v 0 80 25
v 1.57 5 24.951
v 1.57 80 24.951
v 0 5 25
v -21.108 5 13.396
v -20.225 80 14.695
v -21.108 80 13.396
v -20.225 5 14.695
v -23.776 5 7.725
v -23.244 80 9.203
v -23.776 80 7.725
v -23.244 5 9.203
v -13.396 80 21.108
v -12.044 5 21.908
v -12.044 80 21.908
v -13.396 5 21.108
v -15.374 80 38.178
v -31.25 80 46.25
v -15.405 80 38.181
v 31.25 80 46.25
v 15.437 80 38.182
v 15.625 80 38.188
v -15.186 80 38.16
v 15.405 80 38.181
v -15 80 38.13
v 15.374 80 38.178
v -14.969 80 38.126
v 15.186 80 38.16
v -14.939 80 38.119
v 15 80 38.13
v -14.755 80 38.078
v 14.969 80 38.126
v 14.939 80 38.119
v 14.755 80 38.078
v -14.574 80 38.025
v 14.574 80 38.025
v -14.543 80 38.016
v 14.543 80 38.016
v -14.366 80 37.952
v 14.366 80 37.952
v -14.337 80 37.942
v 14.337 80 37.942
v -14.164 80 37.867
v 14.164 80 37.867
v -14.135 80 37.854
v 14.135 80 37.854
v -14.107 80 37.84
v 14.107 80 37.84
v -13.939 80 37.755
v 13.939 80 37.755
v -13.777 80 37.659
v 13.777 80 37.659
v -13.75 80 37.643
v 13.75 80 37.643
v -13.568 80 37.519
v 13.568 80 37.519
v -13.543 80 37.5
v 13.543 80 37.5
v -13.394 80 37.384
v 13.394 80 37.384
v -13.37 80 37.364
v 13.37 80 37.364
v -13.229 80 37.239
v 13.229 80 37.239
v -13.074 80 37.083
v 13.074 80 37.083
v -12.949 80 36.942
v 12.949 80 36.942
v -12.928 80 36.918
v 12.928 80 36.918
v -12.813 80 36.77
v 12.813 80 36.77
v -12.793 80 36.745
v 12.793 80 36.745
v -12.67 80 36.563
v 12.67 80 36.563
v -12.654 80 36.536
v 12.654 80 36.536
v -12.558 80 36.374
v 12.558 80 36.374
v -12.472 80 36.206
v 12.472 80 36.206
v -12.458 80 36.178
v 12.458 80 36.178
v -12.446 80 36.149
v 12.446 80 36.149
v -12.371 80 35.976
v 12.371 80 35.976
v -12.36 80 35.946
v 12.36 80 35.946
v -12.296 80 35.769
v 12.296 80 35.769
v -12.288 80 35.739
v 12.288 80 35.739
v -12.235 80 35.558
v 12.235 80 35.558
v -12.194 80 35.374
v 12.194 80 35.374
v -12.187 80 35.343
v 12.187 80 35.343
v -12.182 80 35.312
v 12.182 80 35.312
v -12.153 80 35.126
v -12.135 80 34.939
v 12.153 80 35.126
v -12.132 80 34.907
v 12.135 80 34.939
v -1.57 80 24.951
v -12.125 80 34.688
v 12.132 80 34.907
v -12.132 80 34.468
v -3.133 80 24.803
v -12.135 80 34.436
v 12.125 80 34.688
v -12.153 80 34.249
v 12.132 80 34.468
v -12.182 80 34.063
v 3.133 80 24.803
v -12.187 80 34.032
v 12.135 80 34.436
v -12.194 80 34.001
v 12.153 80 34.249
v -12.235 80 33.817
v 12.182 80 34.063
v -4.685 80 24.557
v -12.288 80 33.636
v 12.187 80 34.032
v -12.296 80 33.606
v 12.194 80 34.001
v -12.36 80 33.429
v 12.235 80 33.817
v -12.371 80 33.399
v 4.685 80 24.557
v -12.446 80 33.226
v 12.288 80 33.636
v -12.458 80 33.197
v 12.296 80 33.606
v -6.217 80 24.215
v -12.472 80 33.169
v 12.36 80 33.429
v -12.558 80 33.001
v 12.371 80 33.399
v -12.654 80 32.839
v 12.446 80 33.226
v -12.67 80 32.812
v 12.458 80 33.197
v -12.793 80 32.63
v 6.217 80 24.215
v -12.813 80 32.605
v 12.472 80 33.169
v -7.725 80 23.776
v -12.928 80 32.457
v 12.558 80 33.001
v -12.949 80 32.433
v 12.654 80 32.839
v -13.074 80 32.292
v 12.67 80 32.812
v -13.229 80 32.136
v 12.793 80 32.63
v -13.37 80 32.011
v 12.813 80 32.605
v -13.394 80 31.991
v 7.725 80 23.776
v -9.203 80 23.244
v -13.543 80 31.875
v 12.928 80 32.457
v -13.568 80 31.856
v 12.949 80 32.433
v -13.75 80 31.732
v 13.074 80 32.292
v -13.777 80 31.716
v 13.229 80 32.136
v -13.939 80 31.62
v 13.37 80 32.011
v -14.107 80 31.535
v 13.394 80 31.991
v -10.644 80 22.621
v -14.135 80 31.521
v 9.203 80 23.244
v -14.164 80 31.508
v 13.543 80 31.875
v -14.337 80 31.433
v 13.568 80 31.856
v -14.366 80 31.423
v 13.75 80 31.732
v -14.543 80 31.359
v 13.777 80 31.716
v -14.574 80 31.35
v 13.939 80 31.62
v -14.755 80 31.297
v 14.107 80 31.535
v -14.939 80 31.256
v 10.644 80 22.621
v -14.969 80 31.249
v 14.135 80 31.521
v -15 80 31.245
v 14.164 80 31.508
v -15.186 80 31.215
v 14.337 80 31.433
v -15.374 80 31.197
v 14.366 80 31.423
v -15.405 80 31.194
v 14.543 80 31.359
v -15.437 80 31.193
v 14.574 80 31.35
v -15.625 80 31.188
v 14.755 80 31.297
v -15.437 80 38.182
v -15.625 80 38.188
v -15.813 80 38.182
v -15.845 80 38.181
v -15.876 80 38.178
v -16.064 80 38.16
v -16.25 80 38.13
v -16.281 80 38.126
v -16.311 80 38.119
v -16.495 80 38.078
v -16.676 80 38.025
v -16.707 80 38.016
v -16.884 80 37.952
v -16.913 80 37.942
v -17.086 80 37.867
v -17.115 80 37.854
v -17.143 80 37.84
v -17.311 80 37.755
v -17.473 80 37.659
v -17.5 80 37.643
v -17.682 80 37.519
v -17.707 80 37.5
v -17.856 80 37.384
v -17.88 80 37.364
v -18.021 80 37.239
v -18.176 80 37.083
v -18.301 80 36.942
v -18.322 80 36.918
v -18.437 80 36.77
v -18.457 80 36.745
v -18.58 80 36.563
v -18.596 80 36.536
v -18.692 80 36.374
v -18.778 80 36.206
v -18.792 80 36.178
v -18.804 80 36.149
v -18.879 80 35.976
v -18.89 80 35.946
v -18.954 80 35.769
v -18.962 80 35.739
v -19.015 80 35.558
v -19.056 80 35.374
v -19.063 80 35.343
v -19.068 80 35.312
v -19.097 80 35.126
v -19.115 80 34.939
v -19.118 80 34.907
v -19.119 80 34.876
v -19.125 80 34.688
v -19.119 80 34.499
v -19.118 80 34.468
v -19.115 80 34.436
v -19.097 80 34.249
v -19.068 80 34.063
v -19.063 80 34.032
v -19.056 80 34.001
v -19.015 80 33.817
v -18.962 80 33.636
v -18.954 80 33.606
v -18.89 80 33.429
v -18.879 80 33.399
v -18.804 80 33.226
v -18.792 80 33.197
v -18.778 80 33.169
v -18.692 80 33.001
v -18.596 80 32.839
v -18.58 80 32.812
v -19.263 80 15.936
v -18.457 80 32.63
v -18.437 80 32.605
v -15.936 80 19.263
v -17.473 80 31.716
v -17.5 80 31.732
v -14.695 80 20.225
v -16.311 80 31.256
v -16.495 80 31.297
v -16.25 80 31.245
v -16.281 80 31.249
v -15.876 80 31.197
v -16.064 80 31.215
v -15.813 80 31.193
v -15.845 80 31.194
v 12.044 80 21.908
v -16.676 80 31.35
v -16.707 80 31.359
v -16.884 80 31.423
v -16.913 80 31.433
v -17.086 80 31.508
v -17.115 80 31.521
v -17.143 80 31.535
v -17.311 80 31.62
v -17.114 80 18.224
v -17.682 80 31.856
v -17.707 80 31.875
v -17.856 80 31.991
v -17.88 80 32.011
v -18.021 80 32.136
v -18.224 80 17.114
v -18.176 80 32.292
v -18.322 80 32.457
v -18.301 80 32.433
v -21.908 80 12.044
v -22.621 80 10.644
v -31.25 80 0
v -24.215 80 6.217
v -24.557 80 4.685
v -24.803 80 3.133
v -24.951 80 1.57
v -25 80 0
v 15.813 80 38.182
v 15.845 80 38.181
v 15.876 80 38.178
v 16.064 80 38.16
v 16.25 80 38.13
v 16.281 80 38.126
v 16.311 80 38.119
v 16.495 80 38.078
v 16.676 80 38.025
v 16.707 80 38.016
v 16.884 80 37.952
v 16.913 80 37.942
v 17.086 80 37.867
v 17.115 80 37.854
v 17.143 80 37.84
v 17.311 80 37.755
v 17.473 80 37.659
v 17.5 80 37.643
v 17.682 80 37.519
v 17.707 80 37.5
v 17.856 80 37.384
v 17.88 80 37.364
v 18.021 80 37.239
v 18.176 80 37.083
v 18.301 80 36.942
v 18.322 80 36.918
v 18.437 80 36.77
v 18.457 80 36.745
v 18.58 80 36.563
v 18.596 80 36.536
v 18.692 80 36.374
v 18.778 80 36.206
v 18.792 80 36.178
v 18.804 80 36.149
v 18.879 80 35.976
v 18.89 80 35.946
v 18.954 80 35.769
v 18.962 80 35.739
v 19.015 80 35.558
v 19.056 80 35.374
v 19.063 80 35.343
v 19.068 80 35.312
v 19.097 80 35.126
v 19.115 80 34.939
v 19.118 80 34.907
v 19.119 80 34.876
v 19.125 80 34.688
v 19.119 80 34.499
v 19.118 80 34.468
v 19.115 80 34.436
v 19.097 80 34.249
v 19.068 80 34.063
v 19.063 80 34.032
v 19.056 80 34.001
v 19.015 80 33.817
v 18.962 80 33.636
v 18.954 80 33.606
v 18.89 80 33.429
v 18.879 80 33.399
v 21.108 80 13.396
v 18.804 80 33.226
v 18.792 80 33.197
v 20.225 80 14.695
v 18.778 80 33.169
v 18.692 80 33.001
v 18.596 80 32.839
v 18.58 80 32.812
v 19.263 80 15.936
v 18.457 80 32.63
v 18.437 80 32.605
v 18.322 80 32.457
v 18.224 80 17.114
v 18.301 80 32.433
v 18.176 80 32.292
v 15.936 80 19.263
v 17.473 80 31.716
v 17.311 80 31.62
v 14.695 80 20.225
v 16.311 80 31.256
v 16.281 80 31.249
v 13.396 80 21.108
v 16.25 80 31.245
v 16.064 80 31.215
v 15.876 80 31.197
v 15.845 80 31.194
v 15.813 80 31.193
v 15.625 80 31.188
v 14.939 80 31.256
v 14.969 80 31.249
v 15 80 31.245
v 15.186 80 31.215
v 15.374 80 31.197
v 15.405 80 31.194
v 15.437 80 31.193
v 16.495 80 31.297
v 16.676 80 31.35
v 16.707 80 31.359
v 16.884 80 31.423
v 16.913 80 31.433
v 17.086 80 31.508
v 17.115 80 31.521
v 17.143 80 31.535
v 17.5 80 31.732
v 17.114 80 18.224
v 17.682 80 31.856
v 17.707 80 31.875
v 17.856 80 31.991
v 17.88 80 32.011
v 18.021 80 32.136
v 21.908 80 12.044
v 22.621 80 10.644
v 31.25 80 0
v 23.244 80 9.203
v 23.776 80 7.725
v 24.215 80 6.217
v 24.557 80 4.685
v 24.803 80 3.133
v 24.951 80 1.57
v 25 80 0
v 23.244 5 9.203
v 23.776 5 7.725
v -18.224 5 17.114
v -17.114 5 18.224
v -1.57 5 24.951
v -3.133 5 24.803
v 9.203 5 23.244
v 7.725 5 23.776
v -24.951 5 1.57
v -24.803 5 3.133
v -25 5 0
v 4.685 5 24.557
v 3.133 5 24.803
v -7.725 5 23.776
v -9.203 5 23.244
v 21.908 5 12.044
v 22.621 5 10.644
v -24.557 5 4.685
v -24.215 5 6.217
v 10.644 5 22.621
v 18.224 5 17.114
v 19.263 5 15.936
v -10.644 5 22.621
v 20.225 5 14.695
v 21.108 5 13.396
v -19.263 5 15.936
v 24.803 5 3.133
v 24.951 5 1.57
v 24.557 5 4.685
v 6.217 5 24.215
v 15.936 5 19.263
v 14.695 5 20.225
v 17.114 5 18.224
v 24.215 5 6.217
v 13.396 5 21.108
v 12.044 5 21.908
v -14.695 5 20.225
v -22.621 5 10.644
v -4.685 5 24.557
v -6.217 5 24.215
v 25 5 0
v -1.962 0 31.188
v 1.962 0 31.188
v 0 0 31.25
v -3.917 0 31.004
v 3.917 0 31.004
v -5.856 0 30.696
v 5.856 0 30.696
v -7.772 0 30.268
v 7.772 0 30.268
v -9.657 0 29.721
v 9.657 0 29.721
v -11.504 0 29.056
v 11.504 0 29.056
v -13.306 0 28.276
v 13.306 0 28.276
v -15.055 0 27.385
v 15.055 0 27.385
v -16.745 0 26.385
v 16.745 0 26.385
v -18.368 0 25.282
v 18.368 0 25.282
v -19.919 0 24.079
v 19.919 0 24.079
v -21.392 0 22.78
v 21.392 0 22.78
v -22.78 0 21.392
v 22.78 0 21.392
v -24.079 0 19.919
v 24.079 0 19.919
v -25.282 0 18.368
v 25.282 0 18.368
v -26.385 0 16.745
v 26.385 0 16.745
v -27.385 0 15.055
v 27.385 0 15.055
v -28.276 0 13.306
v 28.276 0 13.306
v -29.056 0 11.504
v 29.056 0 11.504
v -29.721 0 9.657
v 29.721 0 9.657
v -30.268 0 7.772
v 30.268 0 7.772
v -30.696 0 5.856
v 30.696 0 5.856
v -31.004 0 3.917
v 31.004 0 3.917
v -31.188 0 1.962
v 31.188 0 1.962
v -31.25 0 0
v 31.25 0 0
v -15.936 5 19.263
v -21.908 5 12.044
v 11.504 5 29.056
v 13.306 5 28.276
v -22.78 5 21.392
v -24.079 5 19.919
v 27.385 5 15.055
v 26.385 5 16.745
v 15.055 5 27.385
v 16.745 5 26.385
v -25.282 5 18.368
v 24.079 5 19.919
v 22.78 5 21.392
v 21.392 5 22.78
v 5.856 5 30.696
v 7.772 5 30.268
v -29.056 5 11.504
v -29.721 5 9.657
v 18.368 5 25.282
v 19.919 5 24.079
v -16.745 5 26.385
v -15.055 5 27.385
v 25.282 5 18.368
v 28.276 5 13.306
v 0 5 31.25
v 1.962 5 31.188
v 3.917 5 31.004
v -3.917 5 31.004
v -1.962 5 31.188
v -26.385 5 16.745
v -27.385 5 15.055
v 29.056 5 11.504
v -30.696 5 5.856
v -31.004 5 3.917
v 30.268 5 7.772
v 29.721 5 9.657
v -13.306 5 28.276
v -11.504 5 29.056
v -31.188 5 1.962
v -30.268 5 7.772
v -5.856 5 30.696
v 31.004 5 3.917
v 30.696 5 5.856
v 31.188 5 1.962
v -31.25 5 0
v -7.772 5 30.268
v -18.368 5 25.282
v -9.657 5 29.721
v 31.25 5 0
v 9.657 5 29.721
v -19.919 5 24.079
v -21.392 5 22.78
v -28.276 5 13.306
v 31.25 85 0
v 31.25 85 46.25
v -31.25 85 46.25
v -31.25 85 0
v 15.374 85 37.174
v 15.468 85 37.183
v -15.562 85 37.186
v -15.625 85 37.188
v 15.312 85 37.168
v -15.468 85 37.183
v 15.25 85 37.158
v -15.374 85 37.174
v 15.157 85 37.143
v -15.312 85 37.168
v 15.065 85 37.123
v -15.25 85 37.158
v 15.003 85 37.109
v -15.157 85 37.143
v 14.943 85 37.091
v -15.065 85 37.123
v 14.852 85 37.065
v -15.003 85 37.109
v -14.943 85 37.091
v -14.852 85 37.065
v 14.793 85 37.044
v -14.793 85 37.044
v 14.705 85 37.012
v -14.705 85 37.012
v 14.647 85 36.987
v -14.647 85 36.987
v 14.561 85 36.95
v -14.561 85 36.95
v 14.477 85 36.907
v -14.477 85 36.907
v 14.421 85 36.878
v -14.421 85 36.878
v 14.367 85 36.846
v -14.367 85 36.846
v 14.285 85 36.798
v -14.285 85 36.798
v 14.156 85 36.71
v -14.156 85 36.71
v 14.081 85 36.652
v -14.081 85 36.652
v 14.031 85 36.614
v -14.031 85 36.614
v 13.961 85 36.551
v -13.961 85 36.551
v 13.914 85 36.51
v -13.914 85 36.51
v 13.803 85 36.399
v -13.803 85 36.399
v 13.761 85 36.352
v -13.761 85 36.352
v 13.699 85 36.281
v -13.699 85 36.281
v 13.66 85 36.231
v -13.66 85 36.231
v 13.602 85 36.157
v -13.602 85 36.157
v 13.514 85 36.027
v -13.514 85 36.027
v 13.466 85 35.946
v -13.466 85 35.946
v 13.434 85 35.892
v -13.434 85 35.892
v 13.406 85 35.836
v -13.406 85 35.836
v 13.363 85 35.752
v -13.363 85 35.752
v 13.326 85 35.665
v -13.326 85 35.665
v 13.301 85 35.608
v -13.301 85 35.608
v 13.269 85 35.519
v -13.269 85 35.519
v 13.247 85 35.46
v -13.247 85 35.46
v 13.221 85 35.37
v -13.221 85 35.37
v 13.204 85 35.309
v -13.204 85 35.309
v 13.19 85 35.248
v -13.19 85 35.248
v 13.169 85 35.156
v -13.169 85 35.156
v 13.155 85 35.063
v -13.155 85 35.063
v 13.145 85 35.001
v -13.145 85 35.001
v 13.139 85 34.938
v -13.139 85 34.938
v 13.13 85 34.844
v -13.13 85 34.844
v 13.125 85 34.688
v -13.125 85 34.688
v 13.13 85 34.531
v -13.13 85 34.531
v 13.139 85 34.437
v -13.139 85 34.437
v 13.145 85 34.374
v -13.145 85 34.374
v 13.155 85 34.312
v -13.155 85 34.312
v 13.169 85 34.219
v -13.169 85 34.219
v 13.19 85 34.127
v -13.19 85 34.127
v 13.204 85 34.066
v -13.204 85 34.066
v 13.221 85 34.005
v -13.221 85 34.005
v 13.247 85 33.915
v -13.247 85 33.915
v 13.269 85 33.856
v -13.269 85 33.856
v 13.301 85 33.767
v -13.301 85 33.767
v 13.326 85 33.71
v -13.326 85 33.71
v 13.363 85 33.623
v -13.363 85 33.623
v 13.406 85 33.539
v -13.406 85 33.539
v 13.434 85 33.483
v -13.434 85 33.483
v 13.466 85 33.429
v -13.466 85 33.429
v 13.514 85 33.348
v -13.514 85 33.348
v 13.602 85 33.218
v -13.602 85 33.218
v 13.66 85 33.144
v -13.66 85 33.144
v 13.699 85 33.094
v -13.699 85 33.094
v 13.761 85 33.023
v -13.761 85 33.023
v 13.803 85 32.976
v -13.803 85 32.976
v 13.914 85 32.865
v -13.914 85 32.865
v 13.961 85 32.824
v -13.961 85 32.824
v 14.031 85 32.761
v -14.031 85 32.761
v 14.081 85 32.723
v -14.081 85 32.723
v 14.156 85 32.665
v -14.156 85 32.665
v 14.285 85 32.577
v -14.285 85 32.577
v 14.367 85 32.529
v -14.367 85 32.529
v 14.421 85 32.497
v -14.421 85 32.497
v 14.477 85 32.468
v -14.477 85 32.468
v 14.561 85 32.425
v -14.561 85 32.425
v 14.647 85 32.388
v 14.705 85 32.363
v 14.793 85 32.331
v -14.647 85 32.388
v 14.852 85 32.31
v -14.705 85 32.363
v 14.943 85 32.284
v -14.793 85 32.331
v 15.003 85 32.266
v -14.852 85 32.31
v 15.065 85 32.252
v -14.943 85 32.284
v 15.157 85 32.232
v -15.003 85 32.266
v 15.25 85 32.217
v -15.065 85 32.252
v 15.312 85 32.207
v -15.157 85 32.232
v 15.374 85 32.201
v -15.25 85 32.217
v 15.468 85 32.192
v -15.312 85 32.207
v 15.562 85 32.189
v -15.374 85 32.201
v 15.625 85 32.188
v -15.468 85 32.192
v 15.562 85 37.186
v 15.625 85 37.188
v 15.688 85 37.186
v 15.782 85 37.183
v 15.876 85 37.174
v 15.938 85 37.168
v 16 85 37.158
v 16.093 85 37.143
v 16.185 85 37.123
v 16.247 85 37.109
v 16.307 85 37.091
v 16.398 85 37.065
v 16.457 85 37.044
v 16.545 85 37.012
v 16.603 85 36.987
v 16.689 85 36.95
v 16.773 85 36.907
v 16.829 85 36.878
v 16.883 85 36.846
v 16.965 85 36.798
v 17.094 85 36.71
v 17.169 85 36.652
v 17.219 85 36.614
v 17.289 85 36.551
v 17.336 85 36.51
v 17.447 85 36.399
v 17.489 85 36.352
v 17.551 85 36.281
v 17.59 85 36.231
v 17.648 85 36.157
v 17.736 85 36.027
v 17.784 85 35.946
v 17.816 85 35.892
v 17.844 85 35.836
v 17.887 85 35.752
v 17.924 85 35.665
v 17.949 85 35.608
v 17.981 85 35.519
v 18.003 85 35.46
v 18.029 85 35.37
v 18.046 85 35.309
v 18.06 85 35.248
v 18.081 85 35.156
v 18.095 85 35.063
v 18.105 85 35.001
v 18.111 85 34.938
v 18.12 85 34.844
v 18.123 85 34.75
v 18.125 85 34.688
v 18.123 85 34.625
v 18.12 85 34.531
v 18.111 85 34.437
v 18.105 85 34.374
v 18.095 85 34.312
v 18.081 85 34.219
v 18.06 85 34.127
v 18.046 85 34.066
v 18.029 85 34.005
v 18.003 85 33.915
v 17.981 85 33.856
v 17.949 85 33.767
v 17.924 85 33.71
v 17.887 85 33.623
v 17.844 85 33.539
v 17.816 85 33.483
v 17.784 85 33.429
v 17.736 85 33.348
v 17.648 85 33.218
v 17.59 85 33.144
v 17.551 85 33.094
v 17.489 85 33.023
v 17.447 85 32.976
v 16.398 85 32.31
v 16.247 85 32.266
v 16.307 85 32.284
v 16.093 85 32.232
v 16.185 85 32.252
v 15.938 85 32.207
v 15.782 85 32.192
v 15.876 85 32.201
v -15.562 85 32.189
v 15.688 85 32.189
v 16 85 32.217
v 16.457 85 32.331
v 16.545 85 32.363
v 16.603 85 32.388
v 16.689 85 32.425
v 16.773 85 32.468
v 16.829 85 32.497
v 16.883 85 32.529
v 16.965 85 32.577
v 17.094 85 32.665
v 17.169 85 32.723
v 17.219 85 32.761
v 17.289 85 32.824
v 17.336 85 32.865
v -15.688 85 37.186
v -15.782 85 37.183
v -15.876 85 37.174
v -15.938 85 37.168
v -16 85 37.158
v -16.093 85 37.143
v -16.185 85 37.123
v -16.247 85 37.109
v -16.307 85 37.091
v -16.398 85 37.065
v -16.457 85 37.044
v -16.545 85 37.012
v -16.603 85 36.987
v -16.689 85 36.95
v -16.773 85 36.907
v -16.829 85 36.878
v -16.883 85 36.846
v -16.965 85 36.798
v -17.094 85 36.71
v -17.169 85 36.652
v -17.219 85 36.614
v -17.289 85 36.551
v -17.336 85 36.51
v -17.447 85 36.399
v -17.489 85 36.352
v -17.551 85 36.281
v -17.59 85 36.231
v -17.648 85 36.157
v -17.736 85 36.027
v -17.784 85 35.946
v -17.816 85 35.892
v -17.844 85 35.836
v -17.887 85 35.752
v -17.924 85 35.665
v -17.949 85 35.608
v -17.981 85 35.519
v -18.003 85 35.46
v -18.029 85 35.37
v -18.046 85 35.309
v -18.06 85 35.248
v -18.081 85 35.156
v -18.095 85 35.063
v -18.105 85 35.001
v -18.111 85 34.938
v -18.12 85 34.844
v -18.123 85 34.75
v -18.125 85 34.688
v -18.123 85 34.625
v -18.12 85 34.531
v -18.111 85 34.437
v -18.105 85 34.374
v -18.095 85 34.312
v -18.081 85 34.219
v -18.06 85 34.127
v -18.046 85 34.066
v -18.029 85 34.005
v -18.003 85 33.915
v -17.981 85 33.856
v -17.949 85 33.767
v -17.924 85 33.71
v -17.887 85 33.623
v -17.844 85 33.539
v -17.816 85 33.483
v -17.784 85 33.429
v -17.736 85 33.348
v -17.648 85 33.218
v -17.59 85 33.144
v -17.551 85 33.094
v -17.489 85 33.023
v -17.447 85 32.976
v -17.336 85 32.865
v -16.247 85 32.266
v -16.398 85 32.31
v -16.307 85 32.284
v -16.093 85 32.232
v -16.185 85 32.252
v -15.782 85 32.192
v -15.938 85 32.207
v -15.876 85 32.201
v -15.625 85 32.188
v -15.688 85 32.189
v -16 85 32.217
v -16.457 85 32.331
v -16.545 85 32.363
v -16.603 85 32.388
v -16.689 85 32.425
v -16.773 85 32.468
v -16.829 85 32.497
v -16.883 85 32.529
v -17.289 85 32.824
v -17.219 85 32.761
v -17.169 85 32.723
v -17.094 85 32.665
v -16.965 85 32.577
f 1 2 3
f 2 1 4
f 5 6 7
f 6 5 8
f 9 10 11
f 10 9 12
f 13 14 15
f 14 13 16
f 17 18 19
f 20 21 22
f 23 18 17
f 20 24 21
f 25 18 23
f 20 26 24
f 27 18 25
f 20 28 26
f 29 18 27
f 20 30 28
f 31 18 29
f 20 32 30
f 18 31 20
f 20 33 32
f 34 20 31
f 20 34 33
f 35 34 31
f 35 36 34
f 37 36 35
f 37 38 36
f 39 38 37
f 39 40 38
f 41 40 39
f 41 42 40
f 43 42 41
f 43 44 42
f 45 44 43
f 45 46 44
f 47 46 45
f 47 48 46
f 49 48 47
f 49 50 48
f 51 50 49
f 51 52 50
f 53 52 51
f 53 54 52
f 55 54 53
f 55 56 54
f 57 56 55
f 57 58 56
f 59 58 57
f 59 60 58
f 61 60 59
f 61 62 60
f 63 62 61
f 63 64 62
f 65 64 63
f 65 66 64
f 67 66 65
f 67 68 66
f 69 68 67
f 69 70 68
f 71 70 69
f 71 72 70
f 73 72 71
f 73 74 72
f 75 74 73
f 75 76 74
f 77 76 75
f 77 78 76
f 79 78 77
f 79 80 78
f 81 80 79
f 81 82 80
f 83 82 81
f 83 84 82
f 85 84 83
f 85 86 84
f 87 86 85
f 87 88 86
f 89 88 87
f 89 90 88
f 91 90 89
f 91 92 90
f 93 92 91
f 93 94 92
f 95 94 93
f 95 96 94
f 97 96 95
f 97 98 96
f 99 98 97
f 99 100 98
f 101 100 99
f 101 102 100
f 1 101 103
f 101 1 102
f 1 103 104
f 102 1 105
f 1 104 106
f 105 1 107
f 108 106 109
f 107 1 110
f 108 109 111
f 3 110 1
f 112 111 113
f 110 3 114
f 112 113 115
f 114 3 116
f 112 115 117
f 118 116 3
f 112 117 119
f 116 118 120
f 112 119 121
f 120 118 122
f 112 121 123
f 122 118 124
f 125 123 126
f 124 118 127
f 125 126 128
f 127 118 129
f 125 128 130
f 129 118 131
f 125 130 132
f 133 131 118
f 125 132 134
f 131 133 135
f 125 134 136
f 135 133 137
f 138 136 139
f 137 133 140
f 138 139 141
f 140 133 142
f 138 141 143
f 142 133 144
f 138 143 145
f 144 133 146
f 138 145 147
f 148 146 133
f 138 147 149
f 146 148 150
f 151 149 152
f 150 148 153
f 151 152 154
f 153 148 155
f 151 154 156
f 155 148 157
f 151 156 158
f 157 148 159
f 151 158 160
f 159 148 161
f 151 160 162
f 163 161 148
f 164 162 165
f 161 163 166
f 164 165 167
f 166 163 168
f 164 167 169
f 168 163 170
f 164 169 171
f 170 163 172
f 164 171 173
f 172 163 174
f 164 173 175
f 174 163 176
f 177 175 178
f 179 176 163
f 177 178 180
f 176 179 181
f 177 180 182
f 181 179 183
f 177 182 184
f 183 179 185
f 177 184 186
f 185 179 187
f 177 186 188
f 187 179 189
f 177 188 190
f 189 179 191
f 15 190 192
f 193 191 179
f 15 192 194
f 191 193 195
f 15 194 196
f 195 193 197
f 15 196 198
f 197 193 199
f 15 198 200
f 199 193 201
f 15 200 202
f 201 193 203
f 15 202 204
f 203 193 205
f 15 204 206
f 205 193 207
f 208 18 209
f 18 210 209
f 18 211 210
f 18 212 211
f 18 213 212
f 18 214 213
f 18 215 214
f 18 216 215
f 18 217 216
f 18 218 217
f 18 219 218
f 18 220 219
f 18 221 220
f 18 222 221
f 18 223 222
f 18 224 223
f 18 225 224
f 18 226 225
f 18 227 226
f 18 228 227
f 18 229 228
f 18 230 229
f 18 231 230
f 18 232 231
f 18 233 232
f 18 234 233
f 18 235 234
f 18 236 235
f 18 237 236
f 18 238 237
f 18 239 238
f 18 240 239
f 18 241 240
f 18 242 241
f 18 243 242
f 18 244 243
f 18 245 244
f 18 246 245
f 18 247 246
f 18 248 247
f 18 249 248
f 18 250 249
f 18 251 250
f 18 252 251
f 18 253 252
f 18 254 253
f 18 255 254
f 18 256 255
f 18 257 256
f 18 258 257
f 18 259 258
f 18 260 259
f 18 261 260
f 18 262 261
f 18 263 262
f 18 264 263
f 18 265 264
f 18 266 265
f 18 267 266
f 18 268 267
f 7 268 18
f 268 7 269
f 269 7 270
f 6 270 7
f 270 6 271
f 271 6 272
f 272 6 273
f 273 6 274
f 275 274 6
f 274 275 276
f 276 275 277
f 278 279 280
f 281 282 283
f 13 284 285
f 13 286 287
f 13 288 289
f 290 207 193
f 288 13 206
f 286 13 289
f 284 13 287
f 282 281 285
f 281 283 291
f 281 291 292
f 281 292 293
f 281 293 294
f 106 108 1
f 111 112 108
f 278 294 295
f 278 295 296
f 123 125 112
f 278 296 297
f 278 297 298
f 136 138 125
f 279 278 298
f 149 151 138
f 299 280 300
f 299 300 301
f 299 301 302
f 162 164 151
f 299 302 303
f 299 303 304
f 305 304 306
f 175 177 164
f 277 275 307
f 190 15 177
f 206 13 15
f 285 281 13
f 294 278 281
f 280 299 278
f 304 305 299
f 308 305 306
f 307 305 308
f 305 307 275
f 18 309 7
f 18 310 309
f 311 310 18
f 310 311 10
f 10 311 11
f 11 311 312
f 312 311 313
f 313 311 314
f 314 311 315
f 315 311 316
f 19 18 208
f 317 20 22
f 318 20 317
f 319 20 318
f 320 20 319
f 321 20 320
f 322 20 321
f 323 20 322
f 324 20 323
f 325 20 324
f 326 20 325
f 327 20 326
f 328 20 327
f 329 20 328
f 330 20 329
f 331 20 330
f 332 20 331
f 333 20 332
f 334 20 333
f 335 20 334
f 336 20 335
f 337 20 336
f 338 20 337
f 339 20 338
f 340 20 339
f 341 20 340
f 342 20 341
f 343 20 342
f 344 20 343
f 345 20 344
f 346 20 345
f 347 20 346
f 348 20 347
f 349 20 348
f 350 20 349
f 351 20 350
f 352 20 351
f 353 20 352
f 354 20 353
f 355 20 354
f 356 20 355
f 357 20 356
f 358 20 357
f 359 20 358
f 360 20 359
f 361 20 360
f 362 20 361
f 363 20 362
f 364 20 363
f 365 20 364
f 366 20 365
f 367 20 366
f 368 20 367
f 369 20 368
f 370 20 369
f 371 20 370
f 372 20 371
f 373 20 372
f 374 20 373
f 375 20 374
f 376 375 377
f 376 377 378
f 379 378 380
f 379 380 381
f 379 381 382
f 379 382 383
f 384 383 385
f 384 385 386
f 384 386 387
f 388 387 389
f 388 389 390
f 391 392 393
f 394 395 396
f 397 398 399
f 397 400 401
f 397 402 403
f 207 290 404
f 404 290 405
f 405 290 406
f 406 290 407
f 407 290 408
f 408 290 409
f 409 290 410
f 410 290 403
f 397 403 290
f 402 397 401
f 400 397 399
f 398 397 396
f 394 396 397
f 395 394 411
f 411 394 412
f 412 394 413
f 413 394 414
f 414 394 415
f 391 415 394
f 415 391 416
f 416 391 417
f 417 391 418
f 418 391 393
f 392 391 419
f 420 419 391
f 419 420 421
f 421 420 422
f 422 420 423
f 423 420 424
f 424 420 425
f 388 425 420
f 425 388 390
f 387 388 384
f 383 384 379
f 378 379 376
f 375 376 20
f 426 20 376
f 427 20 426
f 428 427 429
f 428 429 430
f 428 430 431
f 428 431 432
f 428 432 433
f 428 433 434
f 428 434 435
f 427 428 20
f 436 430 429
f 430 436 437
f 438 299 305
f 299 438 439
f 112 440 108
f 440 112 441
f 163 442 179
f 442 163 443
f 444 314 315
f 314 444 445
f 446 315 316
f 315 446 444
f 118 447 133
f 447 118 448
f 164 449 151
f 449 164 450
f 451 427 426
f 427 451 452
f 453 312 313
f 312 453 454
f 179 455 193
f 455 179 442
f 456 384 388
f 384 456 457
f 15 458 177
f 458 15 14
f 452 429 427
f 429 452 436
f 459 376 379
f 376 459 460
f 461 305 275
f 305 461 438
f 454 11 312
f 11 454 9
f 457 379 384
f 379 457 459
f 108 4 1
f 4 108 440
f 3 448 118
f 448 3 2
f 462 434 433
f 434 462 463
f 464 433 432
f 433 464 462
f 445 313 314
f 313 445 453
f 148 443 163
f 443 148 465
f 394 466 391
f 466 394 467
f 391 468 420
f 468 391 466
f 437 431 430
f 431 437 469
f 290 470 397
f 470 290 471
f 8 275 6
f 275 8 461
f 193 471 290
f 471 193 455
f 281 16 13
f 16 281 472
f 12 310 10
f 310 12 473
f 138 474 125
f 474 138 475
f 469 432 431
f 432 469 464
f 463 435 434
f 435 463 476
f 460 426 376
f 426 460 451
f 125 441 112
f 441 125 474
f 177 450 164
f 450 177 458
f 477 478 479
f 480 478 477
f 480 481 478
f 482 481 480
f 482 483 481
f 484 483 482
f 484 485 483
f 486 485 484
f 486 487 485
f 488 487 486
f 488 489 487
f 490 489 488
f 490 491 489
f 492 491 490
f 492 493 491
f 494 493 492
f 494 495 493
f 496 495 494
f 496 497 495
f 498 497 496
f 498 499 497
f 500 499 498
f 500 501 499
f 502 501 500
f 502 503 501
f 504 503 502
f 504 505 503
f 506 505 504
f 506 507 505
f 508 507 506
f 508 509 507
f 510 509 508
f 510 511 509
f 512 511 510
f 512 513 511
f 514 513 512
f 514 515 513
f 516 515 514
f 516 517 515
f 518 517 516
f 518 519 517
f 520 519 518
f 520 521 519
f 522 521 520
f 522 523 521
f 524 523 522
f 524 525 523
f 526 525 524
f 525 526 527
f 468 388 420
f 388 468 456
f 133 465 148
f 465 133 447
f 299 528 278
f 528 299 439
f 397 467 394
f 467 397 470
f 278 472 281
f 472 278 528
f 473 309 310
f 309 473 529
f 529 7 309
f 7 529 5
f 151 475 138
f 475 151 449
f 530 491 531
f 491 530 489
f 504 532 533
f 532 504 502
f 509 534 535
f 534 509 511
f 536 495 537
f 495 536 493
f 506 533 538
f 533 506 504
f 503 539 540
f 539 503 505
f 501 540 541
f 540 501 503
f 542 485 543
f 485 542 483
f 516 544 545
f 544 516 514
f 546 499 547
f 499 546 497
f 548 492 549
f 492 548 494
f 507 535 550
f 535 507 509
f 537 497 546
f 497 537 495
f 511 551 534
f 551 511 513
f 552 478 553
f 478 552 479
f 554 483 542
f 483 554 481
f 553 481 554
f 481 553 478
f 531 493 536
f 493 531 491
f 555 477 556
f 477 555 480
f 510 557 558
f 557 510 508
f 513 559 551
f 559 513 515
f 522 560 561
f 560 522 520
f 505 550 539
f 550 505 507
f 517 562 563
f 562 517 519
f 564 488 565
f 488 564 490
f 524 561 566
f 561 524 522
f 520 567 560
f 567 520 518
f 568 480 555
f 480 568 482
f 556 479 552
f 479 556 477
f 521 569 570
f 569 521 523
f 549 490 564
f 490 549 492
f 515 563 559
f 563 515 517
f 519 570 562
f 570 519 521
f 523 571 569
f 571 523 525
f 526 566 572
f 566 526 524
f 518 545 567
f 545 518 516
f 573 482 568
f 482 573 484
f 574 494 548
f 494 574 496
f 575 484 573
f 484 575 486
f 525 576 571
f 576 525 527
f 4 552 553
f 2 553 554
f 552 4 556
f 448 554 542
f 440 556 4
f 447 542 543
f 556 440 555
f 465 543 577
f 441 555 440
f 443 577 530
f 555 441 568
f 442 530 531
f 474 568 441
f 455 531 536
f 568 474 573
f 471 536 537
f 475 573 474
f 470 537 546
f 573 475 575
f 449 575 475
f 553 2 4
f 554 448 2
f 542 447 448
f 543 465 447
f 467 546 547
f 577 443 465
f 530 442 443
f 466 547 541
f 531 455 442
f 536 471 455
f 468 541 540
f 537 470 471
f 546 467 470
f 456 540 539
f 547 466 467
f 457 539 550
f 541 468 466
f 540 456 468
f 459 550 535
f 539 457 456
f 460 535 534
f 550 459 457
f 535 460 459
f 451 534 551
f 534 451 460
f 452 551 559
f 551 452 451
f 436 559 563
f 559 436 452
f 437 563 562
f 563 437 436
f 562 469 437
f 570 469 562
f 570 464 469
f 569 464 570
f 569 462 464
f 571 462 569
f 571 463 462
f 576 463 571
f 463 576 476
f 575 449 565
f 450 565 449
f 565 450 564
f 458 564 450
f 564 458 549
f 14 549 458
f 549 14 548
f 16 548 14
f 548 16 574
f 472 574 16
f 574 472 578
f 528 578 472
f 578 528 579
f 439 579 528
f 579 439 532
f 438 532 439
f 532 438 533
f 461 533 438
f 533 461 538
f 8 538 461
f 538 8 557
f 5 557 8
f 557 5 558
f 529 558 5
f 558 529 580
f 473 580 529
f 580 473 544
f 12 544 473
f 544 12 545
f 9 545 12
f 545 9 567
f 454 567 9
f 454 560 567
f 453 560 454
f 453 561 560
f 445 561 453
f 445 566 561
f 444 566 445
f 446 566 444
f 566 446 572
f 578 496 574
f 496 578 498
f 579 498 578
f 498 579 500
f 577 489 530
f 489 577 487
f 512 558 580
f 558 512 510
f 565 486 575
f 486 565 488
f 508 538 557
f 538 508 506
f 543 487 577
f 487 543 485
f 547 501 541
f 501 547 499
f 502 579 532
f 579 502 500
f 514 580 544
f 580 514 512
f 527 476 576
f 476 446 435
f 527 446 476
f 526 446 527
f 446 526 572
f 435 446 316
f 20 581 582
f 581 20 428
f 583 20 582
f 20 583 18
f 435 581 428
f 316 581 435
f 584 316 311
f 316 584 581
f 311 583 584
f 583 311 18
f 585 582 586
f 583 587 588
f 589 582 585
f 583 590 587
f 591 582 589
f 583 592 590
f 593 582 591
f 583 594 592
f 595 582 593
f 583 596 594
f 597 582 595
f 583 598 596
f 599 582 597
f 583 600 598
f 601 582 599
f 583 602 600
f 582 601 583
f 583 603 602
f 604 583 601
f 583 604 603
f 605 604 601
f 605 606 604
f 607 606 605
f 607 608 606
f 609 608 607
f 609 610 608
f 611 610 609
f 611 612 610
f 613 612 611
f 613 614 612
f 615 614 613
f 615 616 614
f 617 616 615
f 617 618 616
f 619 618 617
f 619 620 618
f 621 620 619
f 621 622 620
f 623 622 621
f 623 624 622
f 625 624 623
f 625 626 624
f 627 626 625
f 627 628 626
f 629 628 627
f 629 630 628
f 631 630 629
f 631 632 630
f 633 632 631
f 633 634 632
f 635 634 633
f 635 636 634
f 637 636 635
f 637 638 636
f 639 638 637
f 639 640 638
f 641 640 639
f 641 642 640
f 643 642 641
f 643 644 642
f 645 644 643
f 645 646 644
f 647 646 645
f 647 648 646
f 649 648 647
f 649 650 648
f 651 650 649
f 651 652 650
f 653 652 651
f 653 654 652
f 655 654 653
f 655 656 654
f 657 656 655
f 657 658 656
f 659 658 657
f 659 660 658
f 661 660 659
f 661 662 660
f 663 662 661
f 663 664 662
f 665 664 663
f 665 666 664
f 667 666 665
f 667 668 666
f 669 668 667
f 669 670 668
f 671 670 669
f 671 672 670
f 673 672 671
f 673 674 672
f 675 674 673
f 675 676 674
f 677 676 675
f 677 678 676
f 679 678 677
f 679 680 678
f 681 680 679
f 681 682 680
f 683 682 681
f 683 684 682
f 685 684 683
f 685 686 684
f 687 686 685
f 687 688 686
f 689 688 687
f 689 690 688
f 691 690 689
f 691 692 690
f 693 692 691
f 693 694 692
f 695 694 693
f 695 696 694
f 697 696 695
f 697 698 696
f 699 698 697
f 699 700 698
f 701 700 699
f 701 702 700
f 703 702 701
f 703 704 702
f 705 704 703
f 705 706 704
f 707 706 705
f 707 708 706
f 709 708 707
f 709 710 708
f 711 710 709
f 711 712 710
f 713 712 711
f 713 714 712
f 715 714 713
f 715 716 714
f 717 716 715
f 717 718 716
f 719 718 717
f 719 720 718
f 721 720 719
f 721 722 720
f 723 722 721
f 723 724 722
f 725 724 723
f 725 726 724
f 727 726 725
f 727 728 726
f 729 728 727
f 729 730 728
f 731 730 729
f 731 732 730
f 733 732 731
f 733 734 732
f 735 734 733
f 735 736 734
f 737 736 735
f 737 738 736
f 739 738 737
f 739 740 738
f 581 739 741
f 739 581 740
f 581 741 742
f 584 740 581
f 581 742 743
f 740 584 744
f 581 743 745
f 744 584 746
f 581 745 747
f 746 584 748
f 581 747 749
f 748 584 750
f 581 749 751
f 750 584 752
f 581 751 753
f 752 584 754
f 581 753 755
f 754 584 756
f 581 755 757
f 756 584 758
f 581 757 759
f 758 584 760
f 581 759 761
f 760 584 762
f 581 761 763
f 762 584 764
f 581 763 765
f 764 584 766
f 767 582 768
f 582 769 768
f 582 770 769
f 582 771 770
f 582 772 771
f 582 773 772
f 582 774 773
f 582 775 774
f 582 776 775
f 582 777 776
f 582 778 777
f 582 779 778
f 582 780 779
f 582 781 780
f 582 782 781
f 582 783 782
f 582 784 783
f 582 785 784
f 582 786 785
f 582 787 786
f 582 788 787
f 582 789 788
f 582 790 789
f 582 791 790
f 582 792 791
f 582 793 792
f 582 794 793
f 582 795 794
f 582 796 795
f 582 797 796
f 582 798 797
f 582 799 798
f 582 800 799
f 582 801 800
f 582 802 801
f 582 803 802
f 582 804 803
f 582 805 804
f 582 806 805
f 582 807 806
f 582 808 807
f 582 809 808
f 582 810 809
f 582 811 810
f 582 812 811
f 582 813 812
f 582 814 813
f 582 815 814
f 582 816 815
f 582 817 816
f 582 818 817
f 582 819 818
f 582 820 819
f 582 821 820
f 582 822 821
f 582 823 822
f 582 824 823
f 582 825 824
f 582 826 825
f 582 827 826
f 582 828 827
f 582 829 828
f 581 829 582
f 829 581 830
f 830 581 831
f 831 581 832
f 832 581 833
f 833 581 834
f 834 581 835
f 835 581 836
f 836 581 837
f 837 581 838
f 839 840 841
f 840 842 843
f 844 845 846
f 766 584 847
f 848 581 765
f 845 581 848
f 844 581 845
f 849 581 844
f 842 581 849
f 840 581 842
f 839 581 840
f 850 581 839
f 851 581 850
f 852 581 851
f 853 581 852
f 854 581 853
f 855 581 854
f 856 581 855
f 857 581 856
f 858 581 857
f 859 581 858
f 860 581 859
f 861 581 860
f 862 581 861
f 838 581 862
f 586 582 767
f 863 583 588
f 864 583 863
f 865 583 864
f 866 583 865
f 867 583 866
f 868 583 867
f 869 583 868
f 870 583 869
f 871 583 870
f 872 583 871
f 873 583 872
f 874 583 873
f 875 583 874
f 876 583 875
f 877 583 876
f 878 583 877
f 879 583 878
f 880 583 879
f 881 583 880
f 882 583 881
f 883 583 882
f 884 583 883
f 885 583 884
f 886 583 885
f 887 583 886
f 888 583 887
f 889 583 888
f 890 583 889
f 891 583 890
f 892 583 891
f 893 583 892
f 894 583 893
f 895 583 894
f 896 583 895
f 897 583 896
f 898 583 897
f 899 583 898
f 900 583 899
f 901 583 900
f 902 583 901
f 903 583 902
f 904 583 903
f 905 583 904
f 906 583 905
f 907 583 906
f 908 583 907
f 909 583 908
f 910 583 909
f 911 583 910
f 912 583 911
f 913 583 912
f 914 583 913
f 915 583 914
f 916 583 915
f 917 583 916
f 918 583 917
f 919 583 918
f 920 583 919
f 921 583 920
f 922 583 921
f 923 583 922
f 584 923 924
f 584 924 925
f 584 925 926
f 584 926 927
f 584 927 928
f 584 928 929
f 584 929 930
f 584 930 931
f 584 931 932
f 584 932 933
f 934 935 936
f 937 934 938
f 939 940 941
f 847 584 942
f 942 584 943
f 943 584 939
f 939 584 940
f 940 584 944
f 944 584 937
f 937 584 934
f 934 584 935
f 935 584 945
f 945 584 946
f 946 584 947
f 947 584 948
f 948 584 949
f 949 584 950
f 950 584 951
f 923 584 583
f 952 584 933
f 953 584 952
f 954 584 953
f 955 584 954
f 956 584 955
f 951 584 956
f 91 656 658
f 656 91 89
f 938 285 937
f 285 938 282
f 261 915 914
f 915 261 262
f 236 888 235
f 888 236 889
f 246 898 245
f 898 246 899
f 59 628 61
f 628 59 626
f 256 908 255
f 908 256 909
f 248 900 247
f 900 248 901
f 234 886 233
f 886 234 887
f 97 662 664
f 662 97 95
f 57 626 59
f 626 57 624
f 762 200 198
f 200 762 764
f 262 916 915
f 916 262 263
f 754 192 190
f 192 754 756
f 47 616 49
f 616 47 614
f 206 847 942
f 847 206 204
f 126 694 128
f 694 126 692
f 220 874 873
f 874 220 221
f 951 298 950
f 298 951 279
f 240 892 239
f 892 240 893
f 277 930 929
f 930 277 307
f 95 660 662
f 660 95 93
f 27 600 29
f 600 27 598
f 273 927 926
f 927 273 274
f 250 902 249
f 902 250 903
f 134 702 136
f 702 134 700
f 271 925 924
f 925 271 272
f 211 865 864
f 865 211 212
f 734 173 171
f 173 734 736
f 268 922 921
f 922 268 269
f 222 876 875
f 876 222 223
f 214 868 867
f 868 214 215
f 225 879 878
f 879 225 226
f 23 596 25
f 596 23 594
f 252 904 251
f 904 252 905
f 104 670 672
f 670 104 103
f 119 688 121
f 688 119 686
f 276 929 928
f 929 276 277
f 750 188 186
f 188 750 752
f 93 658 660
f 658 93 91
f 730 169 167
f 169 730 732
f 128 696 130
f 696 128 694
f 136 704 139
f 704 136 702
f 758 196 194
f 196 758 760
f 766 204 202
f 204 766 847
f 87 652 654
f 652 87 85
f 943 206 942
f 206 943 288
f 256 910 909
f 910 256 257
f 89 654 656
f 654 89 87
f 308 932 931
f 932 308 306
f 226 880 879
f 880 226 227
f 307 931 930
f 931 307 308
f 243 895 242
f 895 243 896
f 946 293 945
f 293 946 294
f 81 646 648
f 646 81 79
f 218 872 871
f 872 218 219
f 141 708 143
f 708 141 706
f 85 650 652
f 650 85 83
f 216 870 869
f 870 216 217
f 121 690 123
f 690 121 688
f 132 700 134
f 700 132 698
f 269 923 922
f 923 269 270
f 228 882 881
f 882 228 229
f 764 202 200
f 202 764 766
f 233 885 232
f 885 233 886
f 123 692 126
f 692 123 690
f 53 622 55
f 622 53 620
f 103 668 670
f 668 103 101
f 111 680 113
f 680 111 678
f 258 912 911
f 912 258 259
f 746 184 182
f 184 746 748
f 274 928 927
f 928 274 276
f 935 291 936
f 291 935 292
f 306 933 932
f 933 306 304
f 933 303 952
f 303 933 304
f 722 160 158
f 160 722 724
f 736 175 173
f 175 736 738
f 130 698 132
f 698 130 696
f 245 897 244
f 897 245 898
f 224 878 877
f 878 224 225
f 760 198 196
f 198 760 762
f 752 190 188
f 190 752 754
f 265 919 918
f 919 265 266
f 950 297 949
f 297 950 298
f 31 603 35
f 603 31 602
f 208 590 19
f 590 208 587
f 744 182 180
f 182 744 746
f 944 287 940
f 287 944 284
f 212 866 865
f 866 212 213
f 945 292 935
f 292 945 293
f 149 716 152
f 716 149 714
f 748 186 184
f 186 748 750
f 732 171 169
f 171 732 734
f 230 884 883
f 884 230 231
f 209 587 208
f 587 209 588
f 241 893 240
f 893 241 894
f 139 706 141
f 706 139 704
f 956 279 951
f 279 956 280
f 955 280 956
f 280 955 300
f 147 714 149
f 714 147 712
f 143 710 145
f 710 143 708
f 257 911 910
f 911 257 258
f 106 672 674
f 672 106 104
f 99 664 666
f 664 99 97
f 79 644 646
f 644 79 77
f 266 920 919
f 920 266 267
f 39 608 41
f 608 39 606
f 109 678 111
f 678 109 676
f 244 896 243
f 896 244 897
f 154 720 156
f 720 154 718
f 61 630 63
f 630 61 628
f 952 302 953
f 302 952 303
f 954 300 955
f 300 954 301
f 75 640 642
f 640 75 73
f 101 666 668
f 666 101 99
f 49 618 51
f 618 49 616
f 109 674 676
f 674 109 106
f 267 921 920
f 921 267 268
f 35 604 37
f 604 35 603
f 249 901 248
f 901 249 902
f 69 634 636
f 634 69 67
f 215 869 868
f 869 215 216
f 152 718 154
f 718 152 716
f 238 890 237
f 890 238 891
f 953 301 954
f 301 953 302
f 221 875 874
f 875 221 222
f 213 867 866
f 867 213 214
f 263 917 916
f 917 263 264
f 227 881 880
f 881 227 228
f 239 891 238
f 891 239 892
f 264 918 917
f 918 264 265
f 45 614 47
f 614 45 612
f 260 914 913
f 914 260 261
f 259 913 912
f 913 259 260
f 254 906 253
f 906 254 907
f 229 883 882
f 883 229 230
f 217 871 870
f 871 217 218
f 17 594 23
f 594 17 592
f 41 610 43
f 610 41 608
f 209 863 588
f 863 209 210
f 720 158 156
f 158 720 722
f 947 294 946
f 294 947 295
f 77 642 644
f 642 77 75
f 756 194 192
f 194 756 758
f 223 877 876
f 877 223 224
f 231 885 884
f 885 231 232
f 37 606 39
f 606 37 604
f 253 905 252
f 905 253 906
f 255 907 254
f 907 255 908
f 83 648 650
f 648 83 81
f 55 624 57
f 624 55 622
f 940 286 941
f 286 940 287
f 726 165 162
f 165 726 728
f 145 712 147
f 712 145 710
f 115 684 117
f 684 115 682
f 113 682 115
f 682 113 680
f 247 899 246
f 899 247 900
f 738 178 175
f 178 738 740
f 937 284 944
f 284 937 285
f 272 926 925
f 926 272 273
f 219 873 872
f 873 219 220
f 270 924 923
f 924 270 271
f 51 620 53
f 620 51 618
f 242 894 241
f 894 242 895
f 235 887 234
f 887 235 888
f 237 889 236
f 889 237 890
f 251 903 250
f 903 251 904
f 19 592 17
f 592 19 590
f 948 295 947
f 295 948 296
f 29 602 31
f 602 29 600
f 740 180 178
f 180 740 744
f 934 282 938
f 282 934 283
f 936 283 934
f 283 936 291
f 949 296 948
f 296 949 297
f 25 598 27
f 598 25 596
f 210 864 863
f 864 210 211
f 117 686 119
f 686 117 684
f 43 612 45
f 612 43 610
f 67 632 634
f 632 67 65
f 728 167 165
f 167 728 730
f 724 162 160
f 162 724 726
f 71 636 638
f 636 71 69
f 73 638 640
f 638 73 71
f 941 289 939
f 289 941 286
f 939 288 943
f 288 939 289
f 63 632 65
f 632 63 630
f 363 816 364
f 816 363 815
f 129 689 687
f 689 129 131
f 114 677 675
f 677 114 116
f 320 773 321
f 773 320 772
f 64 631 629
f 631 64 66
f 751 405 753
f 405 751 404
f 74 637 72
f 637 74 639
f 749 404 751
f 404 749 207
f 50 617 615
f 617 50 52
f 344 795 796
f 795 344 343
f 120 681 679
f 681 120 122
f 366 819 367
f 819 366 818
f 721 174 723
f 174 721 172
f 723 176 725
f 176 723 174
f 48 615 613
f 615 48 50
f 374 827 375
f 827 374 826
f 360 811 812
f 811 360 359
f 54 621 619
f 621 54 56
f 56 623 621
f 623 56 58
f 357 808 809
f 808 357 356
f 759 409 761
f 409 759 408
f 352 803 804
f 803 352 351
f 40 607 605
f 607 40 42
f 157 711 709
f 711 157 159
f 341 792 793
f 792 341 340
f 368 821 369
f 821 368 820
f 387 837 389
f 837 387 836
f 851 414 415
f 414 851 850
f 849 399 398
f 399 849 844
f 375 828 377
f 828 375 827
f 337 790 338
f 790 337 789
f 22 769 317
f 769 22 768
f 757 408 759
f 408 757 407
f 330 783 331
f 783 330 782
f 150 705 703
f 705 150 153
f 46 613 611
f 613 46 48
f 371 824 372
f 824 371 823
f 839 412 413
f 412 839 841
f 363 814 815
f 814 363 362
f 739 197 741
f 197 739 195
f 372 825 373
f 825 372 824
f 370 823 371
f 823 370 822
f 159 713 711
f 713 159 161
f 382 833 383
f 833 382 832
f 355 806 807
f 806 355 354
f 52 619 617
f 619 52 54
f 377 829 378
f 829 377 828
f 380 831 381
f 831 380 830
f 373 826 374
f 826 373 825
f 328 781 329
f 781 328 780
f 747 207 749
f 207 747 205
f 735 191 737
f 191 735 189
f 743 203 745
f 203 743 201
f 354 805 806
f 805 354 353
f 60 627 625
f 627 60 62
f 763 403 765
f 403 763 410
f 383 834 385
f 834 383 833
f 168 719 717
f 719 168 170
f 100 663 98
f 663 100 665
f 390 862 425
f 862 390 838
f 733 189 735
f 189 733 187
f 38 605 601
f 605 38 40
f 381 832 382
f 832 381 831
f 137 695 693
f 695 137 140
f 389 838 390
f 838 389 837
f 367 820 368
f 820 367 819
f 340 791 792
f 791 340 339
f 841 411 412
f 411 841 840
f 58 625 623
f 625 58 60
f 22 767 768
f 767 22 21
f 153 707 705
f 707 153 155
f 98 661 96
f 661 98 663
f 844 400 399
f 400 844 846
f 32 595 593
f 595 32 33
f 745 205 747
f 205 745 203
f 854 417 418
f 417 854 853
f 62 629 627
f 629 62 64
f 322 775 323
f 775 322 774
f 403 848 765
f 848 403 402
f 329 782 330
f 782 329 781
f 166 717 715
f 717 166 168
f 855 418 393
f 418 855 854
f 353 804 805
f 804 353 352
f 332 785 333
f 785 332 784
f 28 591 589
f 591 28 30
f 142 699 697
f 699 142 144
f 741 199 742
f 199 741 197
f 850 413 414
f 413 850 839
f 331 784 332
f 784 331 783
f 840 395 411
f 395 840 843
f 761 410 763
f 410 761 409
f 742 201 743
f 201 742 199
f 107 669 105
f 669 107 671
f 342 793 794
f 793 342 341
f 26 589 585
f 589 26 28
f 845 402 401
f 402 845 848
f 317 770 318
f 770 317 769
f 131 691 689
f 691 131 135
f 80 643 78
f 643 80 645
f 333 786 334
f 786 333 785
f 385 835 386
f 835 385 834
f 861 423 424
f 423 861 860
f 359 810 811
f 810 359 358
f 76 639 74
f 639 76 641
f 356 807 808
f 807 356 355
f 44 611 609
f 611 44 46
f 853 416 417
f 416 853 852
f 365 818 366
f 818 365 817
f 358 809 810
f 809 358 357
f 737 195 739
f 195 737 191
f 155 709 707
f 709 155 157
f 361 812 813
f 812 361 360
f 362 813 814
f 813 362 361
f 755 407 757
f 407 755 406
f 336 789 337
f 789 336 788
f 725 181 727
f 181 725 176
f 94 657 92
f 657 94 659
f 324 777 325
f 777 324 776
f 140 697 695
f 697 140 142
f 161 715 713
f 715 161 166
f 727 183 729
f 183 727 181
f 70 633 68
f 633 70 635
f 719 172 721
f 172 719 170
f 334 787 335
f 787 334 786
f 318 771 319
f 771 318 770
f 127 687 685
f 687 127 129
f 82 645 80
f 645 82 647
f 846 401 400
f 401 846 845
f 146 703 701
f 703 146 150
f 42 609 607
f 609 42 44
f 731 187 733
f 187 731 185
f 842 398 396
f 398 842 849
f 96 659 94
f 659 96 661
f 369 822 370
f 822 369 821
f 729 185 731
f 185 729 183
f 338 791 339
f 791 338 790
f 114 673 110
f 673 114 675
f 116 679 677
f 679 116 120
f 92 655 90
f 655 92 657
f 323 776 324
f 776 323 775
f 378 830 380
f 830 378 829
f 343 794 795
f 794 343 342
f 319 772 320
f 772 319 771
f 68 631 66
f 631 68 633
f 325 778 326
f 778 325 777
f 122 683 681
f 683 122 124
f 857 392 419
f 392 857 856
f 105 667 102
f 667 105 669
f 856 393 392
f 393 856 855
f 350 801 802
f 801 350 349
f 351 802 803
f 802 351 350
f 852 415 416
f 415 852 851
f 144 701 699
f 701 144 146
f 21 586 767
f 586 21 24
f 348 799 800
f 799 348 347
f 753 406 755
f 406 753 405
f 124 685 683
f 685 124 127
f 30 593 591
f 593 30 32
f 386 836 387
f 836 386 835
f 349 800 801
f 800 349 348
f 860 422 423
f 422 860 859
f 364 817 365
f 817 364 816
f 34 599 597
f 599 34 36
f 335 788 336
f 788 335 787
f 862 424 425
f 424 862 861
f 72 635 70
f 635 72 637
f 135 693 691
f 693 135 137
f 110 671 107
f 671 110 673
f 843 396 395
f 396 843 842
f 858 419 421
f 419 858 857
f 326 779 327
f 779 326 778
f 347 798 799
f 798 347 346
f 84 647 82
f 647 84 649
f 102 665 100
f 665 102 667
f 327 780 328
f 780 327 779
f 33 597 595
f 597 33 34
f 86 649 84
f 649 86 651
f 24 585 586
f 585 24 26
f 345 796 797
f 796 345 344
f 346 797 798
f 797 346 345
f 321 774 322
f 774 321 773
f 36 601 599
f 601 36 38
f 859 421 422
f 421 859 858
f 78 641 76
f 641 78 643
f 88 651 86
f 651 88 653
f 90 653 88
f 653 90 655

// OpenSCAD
$fn = 100;

hangerDiam = 50;
hangerLen = 80;
capDepth = 5;
capDiam = hangerDiam * 1.25;
mountHeight = capDiam / 2 + 15;
mountWidth = capDiam;
mountDepth = 5;
holeDiam = 4;

difference() {
    union() {
        rotate([-90, 0, 0]) {
            difference() {
                union() {
                    cylinder(h=hangerLen, d=hangerDiam);
                    cylinder(h=capDepth, d=capDiam);
                }
                
                translate([-hangerDiam * 1.25 / 2, 0, -hangerLen * 0.25 / 2]) {
                    cube([hangerDiam * 1.25, hangerDiam * 1.25, hangerLen * 1.25]);
                }
            }
            
        }

        translate([-mountWidth/2, hangerLen, 0]) {
            cube([mountWidth, mountDepth, mountHeight]);
        }
    }

    translate([0, hangerLen-mountDepth/2, mountHeight*.75]) {
        rotate([-90, 0, 0]) {
            translate([-mountWidth/4, 0, 0]) {
                cylinder(h=mountDepth*2, d1=holeDiam*2, d2=holeDiam);
            }

            translate([mountWidth/4, 0, 0]) {
                cylinder(h=mountDepth*2, d1=holeDiam*2, d2=holeDiam);
            }
        }
    }
}
